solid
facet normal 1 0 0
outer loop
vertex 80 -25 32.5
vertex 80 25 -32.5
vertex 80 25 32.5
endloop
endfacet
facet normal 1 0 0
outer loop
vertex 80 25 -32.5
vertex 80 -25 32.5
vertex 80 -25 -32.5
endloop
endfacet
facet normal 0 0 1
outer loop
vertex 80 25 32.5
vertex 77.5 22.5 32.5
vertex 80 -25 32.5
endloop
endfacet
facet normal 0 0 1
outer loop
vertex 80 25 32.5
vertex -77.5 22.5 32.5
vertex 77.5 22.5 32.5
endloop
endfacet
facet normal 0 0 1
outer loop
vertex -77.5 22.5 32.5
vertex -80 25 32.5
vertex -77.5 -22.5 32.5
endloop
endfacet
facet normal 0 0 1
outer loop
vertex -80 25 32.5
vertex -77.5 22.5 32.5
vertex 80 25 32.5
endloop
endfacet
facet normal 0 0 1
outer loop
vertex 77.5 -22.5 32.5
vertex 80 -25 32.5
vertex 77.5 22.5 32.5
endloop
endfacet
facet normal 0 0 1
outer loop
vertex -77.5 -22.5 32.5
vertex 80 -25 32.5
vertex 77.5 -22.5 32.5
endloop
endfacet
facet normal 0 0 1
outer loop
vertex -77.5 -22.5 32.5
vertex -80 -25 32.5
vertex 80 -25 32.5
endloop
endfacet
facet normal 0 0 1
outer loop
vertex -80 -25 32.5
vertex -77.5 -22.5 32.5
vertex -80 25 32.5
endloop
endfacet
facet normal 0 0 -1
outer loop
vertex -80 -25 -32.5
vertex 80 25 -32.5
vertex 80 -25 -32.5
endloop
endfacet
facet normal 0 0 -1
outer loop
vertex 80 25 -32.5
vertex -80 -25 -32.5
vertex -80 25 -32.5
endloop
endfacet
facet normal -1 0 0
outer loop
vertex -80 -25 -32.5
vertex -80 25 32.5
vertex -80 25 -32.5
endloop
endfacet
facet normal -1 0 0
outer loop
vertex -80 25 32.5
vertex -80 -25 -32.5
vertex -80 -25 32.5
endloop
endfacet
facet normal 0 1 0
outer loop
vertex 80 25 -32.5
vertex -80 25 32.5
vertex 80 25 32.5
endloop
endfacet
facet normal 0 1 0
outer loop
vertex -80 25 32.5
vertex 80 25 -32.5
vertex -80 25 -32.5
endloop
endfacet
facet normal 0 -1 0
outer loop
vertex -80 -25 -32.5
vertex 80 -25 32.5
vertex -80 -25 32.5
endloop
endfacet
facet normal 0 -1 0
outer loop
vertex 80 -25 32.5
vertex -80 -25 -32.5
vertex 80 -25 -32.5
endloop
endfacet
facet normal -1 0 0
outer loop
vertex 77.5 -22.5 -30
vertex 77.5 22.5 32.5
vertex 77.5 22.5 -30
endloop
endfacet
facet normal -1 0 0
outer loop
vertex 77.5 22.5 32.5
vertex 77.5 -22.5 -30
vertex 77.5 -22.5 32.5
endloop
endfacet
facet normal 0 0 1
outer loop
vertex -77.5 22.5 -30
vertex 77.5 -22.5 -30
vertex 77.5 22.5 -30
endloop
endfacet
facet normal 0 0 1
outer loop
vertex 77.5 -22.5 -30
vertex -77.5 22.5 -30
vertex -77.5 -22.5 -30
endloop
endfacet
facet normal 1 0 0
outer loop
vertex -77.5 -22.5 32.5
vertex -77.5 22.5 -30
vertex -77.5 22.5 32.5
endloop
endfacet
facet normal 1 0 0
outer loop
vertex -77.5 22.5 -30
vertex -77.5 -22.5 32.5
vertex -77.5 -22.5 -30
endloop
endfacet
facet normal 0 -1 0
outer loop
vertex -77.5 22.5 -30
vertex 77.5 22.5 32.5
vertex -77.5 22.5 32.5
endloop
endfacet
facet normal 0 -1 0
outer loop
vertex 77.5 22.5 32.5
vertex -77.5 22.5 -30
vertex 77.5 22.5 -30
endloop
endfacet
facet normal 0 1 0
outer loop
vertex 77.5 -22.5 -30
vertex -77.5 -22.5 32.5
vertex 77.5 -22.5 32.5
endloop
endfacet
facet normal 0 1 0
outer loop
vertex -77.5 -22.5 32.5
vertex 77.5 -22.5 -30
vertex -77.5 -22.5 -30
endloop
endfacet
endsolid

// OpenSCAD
// ========================================
// a 160 x 50 x 65 mm enclosure with 2.5 mm wall thickness
// NeuroCAD canonical IR; dimensions are millimetres
// ========================================
$fn = 48;

difference() {
  cube(size=[160, 50, 65], center=true);
  translate([0, 0, 1.35]) {
    cube(size=[155, 45, 62.7], center=true);
  }
}
